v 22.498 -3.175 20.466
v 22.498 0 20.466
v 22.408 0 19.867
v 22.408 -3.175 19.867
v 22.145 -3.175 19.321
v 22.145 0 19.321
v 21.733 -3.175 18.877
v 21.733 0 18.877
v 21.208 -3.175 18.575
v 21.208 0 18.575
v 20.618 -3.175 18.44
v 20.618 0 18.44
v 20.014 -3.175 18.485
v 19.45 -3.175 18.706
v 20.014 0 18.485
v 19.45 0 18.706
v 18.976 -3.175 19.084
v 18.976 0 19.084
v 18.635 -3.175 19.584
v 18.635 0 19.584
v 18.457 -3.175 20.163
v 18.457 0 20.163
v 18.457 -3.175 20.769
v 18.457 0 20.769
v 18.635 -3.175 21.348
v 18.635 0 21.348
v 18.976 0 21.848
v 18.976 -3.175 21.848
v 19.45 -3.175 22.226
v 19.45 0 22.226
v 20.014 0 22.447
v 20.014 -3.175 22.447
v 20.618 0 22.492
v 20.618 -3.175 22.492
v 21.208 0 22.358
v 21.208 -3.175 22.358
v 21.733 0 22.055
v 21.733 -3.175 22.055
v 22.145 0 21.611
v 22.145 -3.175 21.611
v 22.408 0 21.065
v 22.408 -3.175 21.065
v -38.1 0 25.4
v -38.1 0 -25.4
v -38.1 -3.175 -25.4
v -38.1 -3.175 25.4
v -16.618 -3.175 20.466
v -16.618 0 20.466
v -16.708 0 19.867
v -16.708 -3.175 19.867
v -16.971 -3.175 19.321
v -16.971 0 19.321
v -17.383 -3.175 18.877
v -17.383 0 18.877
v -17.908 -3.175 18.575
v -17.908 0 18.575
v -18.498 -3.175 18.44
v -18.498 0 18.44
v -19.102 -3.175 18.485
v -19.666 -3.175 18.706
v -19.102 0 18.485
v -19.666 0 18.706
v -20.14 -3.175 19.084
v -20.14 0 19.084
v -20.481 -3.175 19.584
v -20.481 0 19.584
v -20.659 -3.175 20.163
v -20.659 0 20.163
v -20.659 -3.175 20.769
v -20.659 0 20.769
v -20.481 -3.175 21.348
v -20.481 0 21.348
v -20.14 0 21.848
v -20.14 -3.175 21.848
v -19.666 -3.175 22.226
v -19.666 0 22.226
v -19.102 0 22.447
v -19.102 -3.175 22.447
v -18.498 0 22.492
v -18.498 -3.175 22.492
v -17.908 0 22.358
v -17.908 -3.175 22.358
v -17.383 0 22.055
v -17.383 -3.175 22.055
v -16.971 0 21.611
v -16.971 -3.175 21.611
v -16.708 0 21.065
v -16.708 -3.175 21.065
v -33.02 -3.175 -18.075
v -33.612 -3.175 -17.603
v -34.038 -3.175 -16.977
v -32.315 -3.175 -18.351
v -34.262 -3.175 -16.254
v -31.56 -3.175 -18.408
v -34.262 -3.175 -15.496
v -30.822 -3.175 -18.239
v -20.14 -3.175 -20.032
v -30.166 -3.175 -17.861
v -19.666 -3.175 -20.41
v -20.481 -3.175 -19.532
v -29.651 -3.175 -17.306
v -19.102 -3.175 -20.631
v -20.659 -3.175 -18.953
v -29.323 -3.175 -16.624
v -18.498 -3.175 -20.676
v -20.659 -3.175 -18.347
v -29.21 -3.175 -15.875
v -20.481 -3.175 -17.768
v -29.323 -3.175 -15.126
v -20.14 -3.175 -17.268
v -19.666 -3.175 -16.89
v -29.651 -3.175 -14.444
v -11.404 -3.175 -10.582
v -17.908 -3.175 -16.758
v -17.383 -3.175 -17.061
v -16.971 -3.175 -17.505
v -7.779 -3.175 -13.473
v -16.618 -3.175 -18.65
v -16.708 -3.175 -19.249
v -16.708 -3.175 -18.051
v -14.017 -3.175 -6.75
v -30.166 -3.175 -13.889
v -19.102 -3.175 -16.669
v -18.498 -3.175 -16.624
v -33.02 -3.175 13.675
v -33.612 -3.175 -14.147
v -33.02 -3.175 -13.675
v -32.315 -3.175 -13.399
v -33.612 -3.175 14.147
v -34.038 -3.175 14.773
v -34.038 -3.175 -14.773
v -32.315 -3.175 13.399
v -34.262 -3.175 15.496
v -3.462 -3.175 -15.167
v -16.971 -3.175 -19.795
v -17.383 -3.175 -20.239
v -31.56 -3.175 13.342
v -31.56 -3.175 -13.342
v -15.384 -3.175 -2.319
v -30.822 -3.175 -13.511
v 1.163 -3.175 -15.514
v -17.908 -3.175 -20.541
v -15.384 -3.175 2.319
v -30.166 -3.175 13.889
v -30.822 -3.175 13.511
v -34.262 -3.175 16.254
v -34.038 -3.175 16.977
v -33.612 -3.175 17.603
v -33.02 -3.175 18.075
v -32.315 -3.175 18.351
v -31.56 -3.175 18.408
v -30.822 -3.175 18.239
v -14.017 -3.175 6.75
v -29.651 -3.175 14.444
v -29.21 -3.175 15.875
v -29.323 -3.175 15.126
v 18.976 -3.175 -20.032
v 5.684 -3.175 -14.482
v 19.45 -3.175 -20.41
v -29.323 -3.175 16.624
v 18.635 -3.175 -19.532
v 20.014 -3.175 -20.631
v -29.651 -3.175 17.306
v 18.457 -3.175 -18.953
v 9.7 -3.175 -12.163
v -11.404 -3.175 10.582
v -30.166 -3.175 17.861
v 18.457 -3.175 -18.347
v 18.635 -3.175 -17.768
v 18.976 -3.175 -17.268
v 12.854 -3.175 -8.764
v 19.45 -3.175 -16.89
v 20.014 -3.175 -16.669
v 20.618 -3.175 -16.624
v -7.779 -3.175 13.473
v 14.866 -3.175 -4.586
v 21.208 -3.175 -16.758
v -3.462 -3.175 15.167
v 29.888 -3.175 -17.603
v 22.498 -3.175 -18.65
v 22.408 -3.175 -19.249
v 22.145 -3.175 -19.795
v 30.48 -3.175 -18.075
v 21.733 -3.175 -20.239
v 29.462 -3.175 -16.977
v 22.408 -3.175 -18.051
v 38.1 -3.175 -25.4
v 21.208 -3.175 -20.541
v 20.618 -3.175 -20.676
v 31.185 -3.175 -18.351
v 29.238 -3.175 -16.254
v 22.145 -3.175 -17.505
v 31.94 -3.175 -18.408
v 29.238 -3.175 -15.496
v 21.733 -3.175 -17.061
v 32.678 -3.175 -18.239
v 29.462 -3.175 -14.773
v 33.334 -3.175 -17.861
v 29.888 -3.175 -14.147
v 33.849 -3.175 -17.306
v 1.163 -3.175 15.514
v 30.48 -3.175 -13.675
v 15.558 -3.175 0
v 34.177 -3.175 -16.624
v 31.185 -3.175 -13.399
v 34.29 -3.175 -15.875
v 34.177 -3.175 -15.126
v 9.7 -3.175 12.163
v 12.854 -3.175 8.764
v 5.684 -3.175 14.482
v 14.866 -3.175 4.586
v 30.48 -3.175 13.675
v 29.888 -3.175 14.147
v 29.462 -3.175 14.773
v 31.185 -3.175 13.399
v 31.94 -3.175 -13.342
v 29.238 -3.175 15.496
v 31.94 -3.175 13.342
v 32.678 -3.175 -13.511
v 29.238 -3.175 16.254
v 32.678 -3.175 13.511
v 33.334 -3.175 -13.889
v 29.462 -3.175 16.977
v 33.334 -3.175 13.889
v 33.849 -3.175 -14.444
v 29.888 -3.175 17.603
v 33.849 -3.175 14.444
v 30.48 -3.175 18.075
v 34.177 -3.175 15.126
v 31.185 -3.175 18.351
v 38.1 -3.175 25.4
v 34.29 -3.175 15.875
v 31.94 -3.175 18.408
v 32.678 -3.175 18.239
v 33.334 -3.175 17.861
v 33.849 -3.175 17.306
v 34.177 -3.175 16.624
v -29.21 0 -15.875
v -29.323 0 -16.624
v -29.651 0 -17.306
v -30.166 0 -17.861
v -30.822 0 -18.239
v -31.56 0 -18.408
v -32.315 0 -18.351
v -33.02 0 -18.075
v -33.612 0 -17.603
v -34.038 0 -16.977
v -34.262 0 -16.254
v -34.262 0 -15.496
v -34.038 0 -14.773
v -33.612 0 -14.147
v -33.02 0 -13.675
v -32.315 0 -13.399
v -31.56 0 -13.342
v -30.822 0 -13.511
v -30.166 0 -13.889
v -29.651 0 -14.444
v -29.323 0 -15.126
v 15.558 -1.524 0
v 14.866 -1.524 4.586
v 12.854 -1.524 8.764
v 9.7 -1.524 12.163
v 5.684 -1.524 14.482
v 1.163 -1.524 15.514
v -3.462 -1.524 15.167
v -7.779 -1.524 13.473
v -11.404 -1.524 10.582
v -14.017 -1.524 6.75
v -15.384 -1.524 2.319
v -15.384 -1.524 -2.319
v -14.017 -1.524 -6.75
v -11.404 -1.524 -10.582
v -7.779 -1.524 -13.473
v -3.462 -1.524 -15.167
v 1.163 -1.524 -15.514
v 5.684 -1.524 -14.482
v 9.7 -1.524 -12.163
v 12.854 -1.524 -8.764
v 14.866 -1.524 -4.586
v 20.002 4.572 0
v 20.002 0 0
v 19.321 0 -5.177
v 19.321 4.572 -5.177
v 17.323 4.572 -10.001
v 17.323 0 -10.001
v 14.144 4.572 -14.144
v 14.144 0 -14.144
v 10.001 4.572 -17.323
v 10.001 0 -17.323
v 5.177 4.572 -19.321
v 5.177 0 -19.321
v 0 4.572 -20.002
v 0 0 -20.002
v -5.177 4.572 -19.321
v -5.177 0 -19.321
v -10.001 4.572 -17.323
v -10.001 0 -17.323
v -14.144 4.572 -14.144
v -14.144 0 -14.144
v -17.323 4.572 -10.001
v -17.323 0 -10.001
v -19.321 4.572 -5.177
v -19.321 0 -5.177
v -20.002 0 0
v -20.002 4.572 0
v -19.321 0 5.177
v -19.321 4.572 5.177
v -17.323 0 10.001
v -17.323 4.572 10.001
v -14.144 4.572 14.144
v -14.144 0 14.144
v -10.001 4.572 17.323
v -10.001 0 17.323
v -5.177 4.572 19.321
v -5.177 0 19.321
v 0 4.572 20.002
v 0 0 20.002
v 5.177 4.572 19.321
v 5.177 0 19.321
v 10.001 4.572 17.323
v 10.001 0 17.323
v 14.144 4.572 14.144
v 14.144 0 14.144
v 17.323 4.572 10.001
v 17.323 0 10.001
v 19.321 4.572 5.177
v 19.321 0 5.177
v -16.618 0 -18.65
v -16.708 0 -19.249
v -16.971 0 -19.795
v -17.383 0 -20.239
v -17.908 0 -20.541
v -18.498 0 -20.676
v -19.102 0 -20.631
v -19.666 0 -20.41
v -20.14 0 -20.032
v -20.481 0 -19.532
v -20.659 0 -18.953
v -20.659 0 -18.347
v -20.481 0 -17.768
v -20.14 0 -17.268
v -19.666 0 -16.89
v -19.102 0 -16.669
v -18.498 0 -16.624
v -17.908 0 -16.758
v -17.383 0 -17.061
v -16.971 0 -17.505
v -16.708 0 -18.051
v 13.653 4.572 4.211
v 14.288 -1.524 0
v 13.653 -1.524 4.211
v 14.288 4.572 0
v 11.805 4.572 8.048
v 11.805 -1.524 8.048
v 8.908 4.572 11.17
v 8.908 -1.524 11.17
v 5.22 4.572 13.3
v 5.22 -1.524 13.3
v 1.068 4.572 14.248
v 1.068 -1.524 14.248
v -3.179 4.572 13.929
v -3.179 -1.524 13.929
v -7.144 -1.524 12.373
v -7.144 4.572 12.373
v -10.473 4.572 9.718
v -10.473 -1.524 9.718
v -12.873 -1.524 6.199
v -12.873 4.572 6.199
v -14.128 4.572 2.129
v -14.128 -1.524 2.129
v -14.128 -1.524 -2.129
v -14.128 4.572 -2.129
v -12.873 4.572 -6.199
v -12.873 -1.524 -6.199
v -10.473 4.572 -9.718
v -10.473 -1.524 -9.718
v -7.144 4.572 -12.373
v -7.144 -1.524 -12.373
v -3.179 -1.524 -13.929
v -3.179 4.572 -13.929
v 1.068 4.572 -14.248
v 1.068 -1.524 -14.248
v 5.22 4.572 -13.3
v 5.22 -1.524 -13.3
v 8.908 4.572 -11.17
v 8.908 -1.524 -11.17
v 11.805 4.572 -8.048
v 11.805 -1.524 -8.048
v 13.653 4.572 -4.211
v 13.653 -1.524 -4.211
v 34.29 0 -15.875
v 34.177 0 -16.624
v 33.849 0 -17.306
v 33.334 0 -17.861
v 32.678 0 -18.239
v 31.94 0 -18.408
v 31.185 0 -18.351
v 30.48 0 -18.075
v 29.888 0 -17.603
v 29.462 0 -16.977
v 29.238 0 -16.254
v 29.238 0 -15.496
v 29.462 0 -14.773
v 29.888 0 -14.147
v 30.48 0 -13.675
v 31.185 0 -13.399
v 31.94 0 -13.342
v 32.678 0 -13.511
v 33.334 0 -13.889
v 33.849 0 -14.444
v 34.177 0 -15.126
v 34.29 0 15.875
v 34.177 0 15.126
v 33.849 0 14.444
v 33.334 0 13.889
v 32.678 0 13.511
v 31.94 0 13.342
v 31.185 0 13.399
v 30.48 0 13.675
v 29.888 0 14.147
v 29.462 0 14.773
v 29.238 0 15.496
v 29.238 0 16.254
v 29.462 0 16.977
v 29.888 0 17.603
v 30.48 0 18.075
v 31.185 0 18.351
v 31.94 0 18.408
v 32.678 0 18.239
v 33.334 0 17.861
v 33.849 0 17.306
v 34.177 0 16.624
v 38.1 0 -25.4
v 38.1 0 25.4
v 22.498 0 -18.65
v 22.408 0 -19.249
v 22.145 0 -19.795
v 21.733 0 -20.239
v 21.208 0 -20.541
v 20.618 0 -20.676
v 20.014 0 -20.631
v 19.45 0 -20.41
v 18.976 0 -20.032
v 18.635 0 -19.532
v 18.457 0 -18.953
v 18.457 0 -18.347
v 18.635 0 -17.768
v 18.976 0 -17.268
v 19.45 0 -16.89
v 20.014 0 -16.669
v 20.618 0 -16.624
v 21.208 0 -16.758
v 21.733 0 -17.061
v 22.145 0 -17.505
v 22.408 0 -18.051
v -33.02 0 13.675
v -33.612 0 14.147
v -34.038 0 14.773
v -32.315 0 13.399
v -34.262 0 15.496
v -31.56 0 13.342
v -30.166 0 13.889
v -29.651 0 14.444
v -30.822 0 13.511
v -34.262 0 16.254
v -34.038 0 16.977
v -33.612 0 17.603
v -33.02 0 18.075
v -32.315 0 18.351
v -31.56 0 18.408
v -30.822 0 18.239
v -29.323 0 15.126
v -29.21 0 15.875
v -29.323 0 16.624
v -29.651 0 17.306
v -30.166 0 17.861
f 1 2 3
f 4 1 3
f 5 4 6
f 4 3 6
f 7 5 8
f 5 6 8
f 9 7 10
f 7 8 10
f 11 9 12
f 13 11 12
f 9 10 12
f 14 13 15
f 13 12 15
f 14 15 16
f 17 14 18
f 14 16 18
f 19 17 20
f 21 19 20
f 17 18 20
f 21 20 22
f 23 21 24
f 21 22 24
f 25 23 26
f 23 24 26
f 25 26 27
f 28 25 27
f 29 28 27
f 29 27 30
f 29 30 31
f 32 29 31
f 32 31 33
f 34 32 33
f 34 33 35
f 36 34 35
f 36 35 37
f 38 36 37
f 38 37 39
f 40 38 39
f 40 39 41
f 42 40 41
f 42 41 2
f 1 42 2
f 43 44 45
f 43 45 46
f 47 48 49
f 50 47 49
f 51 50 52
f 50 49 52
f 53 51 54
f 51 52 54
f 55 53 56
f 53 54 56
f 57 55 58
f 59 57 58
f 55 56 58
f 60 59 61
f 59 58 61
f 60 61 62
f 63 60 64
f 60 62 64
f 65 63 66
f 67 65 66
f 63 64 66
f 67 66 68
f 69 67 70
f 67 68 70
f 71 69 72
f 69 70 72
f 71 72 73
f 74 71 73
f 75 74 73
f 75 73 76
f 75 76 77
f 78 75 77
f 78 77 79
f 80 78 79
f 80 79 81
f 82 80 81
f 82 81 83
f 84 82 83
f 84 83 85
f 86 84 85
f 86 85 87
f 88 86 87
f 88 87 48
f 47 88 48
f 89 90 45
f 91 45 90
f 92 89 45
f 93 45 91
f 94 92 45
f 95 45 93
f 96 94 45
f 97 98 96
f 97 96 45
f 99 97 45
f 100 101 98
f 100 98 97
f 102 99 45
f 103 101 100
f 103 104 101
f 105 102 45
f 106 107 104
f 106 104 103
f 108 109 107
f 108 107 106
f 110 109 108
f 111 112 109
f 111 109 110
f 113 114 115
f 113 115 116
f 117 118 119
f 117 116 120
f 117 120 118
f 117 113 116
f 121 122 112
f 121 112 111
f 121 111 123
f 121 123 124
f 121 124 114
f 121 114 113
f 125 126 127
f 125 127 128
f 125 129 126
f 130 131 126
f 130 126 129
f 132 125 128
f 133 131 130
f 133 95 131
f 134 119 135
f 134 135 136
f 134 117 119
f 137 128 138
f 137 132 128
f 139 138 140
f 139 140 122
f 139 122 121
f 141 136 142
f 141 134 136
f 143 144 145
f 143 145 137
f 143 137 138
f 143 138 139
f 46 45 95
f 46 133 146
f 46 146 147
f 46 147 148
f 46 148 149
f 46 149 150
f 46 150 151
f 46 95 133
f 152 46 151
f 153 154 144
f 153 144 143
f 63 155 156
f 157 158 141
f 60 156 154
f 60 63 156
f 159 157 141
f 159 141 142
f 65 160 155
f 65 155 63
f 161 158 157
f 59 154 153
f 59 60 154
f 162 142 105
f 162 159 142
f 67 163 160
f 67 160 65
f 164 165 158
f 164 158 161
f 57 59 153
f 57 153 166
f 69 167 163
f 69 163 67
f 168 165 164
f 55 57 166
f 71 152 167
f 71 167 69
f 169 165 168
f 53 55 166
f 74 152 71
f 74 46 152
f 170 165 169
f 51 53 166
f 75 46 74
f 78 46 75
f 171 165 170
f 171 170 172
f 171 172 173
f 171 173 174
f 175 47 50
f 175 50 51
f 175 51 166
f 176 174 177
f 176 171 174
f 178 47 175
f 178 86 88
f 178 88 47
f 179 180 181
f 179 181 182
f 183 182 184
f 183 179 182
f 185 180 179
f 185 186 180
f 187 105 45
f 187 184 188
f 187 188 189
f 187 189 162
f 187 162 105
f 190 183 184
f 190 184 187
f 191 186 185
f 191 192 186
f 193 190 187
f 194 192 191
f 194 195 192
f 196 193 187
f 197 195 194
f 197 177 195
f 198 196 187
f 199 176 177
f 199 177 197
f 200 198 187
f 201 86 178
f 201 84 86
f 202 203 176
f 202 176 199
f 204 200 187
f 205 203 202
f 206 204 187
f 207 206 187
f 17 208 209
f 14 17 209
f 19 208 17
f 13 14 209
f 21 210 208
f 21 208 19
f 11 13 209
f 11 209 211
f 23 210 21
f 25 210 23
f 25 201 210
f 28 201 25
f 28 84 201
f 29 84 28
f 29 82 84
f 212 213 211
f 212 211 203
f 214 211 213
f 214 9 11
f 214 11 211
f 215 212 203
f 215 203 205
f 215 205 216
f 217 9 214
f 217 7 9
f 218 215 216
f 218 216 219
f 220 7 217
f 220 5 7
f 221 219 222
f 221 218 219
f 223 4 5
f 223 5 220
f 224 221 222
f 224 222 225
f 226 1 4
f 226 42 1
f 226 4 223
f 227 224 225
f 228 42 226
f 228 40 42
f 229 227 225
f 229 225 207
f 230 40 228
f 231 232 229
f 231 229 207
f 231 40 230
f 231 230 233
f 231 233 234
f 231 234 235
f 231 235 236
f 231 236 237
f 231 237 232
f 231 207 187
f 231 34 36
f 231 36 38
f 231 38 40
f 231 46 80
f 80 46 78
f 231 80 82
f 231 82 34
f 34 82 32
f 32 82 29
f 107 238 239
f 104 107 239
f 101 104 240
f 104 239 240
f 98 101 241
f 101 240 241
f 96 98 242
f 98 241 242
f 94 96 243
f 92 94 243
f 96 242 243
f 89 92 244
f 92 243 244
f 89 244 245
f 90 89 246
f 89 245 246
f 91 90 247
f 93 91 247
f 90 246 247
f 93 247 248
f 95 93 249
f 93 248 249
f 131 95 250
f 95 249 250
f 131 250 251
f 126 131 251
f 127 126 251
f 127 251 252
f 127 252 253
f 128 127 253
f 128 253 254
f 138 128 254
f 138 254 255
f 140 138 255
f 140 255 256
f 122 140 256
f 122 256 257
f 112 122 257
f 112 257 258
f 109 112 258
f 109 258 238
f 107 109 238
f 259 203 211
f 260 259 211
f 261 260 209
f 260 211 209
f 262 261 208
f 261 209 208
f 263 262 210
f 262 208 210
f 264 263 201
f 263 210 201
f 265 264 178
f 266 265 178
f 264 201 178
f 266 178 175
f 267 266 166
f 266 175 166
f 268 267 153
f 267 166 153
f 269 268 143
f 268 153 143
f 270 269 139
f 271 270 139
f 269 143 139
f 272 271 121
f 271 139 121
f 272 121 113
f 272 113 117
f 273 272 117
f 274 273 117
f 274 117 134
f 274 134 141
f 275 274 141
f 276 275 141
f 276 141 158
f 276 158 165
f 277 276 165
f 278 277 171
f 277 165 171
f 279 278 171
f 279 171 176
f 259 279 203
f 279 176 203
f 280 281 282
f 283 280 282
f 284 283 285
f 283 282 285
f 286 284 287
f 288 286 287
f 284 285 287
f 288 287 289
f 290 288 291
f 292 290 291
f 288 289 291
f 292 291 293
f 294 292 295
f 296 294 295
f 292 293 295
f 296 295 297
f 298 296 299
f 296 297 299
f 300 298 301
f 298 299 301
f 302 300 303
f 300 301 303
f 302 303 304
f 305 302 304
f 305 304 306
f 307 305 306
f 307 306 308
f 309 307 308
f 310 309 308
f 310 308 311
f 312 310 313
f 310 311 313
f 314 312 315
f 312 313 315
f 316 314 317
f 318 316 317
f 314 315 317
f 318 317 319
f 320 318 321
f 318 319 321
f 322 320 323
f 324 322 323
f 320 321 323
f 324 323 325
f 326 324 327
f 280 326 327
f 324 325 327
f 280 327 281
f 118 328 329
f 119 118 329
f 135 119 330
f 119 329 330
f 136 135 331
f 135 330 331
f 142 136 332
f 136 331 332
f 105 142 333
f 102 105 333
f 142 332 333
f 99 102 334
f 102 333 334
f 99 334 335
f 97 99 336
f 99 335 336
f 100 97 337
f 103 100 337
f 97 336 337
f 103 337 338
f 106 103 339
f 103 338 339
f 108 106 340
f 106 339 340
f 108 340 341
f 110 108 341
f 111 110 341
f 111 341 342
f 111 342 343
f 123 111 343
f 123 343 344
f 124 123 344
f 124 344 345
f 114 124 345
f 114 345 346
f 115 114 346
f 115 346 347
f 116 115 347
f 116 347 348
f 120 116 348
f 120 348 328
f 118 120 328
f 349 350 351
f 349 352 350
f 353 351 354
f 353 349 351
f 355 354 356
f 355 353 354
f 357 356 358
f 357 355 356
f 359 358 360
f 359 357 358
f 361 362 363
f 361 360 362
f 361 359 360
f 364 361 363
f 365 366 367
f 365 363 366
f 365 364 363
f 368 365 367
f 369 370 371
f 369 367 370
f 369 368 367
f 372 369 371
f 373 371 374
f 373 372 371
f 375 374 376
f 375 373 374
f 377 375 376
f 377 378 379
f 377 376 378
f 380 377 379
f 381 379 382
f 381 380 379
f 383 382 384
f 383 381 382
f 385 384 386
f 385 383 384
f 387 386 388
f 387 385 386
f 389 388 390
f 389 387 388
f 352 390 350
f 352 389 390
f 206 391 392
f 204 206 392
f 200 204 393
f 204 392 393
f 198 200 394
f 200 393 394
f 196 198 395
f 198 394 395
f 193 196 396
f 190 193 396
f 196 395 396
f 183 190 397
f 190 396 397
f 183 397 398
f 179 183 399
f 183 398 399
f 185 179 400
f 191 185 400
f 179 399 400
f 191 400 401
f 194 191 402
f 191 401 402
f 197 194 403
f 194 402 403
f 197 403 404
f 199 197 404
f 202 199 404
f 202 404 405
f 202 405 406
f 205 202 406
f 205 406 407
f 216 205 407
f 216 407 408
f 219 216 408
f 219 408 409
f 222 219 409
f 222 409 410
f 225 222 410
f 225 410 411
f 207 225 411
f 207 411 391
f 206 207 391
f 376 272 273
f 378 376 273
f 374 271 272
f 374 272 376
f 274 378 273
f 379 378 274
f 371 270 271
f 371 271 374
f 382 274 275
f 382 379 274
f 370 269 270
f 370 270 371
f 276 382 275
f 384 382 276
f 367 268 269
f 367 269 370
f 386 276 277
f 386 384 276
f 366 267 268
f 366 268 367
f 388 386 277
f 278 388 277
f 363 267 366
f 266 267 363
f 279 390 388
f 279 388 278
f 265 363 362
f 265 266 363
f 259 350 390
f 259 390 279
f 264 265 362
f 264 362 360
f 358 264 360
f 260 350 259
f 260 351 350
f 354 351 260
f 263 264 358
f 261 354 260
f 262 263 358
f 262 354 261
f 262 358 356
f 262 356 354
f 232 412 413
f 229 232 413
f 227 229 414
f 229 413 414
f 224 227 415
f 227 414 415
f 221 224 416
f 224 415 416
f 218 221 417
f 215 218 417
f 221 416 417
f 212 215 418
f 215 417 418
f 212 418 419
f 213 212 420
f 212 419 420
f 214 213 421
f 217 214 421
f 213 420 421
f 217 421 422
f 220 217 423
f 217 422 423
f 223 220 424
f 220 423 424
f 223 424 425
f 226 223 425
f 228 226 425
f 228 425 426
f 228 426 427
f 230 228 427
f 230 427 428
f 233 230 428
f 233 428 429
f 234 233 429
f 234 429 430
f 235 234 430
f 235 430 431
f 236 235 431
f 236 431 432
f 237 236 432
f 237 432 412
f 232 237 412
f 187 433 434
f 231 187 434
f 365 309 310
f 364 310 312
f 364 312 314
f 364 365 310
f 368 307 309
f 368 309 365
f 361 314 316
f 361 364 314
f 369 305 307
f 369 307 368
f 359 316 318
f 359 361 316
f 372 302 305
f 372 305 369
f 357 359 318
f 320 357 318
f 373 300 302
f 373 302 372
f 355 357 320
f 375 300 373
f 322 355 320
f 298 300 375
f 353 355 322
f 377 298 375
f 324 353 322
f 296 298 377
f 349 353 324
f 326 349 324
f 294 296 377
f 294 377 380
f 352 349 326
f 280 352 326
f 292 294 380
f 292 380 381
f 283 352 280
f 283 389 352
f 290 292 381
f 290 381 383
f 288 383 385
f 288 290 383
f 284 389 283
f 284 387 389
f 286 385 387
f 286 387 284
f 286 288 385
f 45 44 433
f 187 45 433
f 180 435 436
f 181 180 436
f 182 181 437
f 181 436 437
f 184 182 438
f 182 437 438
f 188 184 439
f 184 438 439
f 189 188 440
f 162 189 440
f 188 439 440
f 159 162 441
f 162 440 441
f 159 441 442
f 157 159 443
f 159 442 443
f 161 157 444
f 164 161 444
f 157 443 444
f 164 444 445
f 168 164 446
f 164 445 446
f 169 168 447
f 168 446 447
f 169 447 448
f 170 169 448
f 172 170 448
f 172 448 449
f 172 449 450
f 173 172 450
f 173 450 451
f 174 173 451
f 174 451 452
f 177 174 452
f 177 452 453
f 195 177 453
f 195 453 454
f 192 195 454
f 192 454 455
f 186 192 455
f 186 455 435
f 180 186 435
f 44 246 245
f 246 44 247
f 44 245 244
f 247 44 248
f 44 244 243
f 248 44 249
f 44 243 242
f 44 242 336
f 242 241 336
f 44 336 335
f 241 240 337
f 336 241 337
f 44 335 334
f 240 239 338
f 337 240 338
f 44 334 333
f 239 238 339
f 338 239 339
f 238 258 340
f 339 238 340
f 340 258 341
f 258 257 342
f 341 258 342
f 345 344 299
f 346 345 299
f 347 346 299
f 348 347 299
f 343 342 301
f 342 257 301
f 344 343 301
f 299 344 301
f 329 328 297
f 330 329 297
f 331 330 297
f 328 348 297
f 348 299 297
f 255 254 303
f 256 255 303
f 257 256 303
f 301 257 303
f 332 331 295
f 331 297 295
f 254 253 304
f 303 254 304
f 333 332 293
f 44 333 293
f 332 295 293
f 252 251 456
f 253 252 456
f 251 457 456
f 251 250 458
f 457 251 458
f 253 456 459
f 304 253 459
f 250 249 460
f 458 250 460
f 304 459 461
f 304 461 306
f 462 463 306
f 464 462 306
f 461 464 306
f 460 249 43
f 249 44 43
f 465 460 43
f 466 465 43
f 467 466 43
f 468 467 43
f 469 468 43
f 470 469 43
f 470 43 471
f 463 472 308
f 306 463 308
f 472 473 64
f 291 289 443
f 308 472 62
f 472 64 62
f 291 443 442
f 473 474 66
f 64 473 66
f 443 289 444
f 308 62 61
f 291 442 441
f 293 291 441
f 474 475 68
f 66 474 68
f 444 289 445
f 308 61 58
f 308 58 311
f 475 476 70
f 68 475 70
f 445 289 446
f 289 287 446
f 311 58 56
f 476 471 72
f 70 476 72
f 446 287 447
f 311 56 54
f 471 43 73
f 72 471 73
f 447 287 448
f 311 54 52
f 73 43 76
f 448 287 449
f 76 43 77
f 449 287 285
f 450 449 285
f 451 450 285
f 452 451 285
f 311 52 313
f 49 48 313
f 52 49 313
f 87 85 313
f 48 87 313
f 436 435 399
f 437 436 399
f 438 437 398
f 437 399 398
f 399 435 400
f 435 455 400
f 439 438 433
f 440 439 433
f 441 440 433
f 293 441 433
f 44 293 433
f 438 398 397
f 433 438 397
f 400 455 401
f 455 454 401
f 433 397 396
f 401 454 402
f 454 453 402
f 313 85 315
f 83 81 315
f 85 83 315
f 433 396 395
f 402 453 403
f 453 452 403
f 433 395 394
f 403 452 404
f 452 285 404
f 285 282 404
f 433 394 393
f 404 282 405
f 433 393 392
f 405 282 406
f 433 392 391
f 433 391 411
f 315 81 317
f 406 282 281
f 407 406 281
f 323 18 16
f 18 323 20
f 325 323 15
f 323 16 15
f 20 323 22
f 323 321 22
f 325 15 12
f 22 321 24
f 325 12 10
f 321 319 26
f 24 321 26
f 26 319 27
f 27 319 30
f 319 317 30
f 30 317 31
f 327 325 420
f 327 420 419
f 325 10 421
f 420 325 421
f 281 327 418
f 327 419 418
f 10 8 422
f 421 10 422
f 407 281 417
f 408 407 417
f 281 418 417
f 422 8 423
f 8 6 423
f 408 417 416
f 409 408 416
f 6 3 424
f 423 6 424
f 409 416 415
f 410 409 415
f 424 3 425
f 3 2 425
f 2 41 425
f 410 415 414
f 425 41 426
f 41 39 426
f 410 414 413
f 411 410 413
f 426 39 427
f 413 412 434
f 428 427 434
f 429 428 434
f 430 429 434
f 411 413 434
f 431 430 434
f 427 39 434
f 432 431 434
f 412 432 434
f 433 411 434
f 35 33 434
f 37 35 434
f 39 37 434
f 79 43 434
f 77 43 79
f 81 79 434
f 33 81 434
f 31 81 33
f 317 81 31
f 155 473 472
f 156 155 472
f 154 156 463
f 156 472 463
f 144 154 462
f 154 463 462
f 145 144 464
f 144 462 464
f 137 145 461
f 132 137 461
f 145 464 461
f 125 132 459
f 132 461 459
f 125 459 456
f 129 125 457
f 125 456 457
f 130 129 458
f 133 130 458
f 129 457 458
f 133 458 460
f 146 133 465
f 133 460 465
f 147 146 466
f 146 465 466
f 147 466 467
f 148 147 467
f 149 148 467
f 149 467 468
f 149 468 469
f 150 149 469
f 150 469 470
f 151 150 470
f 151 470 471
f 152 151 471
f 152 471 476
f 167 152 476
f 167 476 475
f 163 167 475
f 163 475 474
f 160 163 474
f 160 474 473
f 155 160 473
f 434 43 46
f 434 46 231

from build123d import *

# Parameters (mm, degrees)
SKETCH1_R           = 20.0025
SKETCH1_R_2         = 14.2875
BOSS_EXTRUDE1_DEPTH = 4.572
SKETCH2_W           = 76.2
SKETCH2_H           = 50.8
SKETCH2_R           = 14.2875
BOSS_EXTRUDE2_DEPTH = 3.175
SKETCH3_R           = 15.5575
CUT_EXTRUDE1_DEPTH  = 1.651
SKETCH5_R           = 2.032
SKETCH5_R_2         = 2.54
CUT_EXTRUDE2_DEPTH  = 4.175


with BuildPart() as part:
    # Sketch1 → Boss-Extrude1 (new body)
    with BuildSketch(Plane(origin=(0, 0, 0), x_dir=(1, 0, 0), z_dir=(0, 1, 0))):
        Circle(SKETCH1_R)
        Circle(SKETCH1_R_2, mode=Mode.SUBTRACT)
    extrude(amount=BOSS_EXTRUDE1_DEPTH)

    # Sketch2 → Boss-Extrude2 (add)
    with BuildSketch(Plane.XZ):
        Rectangle(SKETCH2_W, SKETCH2_H)
        Circle(SKETCH2_R, mode=Mode.SUBTRACT)
    extrude(amount=BOSS_EXTRUDE2_DEPTH)

    # Sketch3 → Cut-Extrude1 (cut)
    with BuildSketch(Plane.XZ.offset(3.175)):
        Circle(SKETCH3_R)
    extrude(amount=-CUT_EXTRUDE1_DEPTH, mode=Mode.SUBTRACT)

    # Sketch5 → Cut-Extrude2 (cut, through all)
    with BuildSketch(Plane(origin=(0, 0, 0), x_dir=(1, 0, 0), z_dir=(0, 1, 0))):
        with Locations((-18.64995, 18.64995)):
            Circle(SKETCH5_R)
        with Locations((20.46605, 18.64995)):
            Circle(SKETCH5_R)
        with Locations((-18.64995, -20.46605)):
            Circle(SKETCH5_R)
        with Locations((20.46605, -20.46605)):
            Circle(SKETCH5_R)
        with Locations((-31.75, 15.875)):
            Circle(SKETCH5_R_2)
        with Locations((31.75, 15.875)):
            Circle(SKETCH5_R_2)
        with Locations((31.75, -15.875)):
            Circle(SKETCH5_R_2)
        with Locations((-31.75, -15.875)):
            Circle(SKETCH5_R_2)
    extrude(amount=-CUT_EXTRUDE2_DEPTH, mode=Mode.SUBTRACT)


solid = part.part
